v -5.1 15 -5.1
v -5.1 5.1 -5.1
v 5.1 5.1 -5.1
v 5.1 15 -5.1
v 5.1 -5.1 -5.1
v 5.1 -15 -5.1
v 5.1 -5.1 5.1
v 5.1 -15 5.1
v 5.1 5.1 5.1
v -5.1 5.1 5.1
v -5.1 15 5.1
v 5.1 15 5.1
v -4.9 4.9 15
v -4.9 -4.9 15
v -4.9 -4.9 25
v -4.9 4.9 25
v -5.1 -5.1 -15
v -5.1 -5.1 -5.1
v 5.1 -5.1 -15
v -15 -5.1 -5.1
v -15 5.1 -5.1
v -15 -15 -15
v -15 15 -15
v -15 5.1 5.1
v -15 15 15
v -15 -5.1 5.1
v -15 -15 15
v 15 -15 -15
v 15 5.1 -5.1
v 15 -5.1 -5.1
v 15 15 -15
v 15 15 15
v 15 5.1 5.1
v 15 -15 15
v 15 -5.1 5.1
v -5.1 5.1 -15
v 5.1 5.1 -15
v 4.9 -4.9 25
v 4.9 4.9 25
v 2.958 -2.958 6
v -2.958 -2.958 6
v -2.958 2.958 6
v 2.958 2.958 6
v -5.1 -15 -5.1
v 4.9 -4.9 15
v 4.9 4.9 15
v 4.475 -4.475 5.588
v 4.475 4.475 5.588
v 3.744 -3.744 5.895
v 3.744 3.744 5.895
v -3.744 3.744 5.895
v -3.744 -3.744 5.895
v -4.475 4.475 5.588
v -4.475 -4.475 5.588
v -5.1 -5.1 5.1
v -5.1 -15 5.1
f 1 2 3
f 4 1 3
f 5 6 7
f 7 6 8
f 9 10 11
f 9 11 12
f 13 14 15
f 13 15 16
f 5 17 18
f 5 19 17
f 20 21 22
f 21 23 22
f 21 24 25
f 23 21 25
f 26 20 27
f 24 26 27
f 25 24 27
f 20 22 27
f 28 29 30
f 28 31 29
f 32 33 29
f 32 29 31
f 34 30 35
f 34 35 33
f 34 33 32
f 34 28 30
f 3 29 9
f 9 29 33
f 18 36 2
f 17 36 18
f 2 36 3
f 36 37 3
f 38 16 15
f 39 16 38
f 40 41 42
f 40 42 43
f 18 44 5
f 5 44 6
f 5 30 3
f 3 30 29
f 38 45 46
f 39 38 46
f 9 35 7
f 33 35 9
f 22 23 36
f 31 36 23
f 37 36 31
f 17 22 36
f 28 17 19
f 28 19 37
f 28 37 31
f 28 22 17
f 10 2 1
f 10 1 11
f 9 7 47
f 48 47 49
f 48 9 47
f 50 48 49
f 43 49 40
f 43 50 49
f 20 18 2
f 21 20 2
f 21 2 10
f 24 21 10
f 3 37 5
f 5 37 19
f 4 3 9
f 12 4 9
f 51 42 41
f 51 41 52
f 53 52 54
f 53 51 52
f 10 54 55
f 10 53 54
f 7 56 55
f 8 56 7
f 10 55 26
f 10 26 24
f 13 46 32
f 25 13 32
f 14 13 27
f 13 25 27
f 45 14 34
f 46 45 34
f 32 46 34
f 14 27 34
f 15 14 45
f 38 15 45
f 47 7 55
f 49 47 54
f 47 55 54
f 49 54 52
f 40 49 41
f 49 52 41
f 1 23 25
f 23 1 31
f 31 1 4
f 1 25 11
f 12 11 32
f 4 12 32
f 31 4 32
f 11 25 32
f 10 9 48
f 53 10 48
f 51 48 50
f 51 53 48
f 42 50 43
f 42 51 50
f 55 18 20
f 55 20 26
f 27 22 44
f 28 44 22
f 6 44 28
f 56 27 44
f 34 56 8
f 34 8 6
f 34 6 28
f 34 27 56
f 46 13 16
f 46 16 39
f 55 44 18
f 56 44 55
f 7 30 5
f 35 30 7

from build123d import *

# Parameters (mm, degrees)
F0_W         = 30
F0_H         = 30
F1_DEPTH     = 15
F2_W         = 9.8
F2_H         = 9.8
F3_DEPTH     = 10
F4_W         = 10.2
F4_H         = 10.2
F5_DEPTH     = 21
F6_W         = 10.2
F6_H         = 10.2
F7_DEPTH     = 30
F8_W         = 10.2
F8_H         = 10.2
F9_DEPTH     = 30.001
F10_T1_DEPTH = 20.9121426428
F10_T3_DEPTH = 20.9121426428


# Not quite as in the source:
# - a fillet or chamfer that OpenCascade refuses, or shapes differently, is made with other operations: its cross-section is extruded or revolved along the edge and cut away or added


with BuildPart() as f1:
    # F0 (on Front) → F1 (new body, symmetric)
    with BuildSketch(Plane.XZ):
        Rectangle(F0_W, F0_H)
    extrude(amount=F1_DEPTH, both=True)

    # F2 (on face) → F3 (join)
    with BuildSketch(Plane.XY.offset(15)):
        Rectangle(F2_W, F2_H)
    extrude(amount=F3_DEPTH)

    # F4 (on face) → F5 (cut)
    with BuildSketch(Plane(origin=(0, 0, -15), x_dir=(1, 0, 0), z_dir=(0, 0, -1))):
        Rectangle(F4_W, F4_H)
    extrude(amount=-F5_DEPTH, mode=Mode.SUBTRACT)

    # F6 (on face) → F7 (cut)
    with BuildSketch(Plane.YZ.offset(15)):
        Rectangle(F6_W, F6_H)
    extrude(amount=-F7_DEPTH, mode=Mode.SUBTRACT)

    # F8 (on face) → F9 (cut, through all)
    with BuildSketch(Plane.XZ.offset(15)):
        Rectangle(F8_W, F8_H)
    extrude(amount=-F9_DEPTH, mode=Mode.SUBTRACT)

    # F10: fillet of radius 3 on 4 edges, made by hand

    # F10_s2 → F10_t1 (join)
    with BuildSketch(Plane.YZ.offset(-10.4560713214)):
        with BuildLine():
            ThreePointArc((-5.1, 5.1), (-4.1194664753, 5.7658633372), (-2.9575714714, 6))
            Line((-2.9575714714, 6), (-5.1, 6))
            Line((-5.1, 6), (-5.1, 5.1))
        make_face()
        with BuildLine():
            ThreePointArc((5.1, 5.1), (4.1194664753, 5.7658633372), (2.9575714714, 6))
            Line((2.9575714714, 6), (5.1, 6))
            Line((5.1, 6), (5.1, 5.1))
        make_face()
    extrude(amount=F10_T1_DEPTH)

    # F10_s4 → F10_t3 (join)
    with BuildSketch(Plane.XZ.offset(-10.4560713214)):
        with BuildLine():
            ThreePointArc((5.1, 5.1), (4.1194664753, 5.7658633372), (2.9575714714, 6))
            Line((2.9575714714, 6), (5.1, 6))
            Line((5.1, 6), (5.1, 5.1))
        make_face()
        with BuildLine():
            ThreePointArc((-2.9575714714, 6), (-4.1194664753, 5.7658633372), (-5.1, 5.1))
            Line((-5.1, 5.1), (-5.1, 6))
            Line((-5.1, 6), (-2.9575714714, 6))
        make_face()
    extrude(amount=F10_T3_DEPTH)


solid = f1.part
